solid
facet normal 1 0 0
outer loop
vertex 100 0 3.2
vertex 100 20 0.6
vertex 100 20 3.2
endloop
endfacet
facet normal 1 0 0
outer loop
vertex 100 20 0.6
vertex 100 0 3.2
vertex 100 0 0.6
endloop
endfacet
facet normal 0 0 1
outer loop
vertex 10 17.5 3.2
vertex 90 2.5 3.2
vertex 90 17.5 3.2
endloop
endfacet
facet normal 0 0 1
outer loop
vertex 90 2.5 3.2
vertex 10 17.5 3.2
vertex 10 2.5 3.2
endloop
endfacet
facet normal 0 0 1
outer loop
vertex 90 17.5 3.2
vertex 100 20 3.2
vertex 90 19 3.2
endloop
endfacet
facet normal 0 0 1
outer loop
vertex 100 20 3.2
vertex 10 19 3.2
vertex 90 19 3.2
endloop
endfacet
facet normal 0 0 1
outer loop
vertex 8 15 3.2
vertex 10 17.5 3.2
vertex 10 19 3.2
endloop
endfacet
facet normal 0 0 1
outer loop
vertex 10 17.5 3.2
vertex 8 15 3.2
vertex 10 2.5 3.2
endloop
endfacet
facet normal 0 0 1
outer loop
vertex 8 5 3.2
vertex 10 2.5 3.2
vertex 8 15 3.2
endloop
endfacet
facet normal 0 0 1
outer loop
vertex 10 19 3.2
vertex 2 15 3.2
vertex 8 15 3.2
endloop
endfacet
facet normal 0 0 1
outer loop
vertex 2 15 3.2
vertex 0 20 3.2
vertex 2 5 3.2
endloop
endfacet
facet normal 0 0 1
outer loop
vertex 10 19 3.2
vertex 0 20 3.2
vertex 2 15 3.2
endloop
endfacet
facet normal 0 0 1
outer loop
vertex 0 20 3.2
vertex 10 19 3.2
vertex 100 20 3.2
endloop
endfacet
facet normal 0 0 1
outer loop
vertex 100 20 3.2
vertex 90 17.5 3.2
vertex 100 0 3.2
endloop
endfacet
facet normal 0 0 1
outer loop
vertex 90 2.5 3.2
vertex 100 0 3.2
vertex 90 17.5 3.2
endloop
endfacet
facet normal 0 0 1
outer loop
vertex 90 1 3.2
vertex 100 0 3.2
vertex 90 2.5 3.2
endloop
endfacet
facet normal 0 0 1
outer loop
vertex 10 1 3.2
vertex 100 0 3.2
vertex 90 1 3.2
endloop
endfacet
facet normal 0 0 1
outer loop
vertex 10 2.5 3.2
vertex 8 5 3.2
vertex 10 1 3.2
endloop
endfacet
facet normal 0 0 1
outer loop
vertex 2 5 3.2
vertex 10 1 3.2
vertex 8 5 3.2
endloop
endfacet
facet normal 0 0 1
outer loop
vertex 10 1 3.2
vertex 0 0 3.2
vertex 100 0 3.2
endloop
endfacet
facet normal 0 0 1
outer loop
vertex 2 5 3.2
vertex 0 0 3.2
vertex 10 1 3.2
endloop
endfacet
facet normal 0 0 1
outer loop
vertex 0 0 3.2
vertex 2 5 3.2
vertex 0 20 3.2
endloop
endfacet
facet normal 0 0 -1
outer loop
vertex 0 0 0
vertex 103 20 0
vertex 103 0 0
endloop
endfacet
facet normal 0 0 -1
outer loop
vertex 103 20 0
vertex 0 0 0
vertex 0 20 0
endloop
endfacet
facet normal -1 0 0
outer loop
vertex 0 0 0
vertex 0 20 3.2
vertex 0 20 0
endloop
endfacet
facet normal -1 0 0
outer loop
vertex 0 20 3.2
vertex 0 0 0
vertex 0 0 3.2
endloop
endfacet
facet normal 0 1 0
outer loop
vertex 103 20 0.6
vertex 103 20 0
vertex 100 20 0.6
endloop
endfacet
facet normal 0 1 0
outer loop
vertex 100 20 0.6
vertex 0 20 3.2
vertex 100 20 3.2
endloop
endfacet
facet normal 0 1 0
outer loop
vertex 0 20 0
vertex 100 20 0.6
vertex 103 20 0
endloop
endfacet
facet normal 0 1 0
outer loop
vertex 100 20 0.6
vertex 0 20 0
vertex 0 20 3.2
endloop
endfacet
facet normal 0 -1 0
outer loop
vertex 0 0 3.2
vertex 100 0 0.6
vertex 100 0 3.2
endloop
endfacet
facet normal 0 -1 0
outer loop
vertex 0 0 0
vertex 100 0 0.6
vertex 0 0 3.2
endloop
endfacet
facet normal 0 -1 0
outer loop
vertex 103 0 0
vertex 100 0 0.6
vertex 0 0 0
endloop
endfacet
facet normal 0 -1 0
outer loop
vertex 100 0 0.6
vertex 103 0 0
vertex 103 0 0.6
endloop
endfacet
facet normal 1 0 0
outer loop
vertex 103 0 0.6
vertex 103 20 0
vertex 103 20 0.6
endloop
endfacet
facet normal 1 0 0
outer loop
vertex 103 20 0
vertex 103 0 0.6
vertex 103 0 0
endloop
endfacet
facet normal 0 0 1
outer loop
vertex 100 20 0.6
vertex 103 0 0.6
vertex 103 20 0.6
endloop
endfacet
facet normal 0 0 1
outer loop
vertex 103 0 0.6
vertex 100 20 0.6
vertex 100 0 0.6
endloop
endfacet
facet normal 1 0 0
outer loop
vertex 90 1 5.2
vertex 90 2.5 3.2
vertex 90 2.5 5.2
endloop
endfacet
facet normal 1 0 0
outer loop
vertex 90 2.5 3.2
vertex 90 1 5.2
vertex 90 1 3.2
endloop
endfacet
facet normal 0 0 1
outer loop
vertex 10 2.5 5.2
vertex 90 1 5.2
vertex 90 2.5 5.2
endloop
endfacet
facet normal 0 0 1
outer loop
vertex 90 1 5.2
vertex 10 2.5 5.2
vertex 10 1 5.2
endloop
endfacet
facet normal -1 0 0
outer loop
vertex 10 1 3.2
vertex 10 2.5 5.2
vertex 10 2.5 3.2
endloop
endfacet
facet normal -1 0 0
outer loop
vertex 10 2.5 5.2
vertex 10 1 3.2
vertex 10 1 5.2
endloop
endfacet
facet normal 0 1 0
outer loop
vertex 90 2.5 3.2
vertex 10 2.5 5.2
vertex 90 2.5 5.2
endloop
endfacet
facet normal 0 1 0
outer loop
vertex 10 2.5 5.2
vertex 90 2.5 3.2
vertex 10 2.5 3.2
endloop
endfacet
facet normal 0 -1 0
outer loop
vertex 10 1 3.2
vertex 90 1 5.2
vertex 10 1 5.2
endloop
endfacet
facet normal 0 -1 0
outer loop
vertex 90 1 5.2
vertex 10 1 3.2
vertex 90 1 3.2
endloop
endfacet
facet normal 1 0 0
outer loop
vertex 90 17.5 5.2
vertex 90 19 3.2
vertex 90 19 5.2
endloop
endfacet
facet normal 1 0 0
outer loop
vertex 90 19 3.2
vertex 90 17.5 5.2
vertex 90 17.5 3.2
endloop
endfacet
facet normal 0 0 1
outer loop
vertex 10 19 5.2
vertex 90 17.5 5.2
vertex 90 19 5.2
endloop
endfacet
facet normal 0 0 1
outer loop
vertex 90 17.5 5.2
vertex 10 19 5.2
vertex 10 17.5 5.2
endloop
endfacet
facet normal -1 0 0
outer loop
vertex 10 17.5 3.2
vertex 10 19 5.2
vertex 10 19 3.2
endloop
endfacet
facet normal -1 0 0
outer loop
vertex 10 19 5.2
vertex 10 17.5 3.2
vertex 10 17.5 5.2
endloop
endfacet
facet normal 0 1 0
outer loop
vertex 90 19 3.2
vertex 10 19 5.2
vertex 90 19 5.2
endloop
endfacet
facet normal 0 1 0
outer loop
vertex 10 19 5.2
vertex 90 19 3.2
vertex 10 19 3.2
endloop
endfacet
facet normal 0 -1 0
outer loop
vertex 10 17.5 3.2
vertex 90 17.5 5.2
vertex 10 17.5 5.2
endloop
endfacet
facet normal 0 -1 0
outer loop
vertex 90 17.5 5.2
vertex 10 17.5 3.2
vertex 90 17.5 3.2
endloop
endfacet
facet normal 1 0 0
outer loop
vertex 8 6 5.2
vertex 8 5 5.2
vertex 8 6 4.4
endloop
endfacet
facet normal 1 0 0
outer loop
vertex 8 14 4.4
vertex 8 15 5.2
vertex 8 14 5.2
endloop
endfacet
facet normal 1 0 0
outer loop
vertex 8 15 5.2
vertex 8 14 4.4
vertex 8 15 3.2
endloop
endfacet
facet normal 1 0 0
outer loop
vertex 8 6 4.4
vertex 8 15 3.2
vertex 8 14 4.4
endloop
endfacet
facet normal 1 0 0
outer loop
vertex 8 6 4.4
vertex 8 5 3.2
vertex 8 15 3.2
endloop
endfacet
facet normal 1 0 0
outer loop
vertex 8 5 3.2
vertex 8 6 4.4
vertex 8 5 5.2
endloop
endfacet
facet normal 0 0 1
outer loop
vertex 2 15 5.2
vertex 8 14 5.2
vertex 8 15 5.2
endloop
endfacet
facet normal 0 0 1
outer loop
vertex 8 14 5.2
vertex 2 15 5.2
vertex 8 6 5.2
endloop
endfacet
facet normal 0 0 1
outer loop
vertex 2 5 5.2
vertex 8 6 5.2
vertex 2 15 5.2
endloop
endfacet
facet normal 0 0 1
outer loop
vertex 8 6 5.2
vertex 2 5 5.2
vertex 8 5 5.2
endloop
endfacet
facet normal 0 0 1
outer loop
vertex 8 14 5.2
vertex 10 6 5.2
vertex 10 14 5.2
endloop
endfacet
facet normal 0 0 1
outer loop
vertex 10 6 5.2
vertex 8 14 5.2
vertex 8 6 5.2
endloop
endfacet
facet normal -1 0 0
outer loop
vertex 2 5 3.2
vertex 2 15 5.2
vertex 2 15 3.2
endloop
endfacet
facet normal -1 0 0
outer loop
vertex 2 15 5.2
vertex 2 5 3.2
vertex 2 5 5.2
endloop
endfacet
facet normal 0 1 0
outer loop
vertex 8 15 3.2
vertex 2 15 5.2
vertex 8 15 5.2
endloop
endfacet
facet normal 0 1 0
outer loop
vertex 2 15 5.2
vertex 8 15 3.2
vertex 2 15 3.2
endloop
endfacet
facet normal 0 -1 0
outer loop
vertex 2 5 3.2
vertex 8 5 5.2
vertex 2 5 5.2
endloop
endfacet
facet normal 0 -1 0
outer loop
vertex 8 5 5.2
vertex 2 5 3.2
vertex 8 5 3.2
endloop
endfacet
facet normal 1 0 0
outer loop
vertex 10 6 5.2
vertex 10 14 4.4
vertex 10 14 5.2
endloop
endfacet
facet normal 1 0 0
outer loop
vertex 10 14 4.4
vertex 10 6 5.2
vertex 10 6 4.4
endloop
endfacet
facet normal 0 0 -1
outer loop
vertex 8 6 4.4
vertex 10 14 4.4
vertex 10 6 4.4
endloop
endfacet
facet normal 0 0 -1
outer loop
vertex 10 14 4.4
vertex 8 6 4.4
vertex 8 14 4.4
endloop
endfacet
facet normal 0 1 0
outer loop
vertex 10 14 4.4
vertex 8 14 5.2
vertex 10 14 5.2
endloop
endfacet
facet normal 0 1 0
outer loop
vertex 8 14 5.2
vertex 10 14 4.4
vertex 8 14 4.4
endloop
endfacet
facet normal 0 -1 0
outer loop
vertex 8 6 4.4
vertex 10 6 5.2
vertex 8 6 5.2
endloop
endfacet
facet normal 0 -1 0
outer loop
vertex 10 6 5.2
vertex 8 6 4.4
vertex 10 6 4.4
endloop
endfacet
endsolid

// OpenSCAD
// Bag clip with living hinge - PETG, 0.4mm nozzle, no supports
// Printed open flat (two arms end-to-end), closes by folding 180deg about Y.
// Lower arm at origin, upper arm local origin at its hinge edge.

part = "arm_lower"; // [arm_lower, arm_upper, assembly]
cadverify_only = "";

/* Dimensions (mm) */
Lbody = 100;      // arm body length
Wbody = 20;       // arm width
Tbody = 3.2;      // arm thickness
Hhinge = 6;       // total hinge length (gap between bodies)
Hhalf = 3;        // hinge half length per arm
Thinge = 0.6;     // hinge thickness
Bgap = 2.0;       // bag thickness / closed gap
Ttot = Tbody + Bgap; // 5.2 closed inner top
Zpiv = Tbody + Bgap/2; // 4.2 pivot height
Xpiv = Lbody + Hhalf;  // 103 pivot X in assembly

module instance(name, part, unit = 1) {
    echo(cadverify_instance = [name, part, unit]);
    if (cadverify_only == "" || cadverify_only == name) children();
}

// ---------- lower arm geometry (print orientation, min at 0) ----------
module arm_lower() {
    // body
    cube([Lbody, Wbody, Tbody], false);
    // hinge half (thin, on bed), overlap 0.1 into body
    translate([Lbody-0.1, 0, 0])
        cube([Hhalf+0.1, Wbody, Thinge], false);
    // (no heel: the ribs and latch towers are the close stop)
    // ribs (2mm tall standoff), overlap 0.1 into body
    translate([10, 1, Tbody-0.1])
        cube([80, 1.5, Bgap+0.1], false);
    translate([10, 17.5, Tbody-0.1])
        cube([80, 1.5, Bgap+0.1], false);
    // latch tower, overlap into body
    translate([2, 5, Tbody-0.1])
        cube([6, 10, Bgap+0.1], false);
    // latch lip (cantilever +X), overlap into tower
    translate([7.9, 6, 4.4])
        cube([2.1, 8, 0.8], false);
}

// ---------- upper arm geometry (print orientation, hinge at x=0) ----------
module arm_upper() {
    // hinge half on bed
    cube([Hhalf+0.1, Wbody, Thinge], false);
    // body, overlap into hinge
    translate([Hhalf-0.1, 0, 0])
        cube([Lbody+0.1, Wbody, Tbody], false);
    // latch tower (maps to closed x=12-18), overlap into body
    translate([85, 5, Tbody-0.1])
        cube([6, 10, Bgap+0.1], false);
    // latch lip (extends +X toward free end), overlap into tower
    translate([90.9, 6, 4.2])
        cube([2.5, 8, 1.0], false);
    // thumb tab beyond free end, same thickness as body, overlap
    translate([102.9, 6, 0])
        cube([8.1, 8, Tbody], false);
}

// ---------- part / assembly dispatch ----------
if (part == "arm_lower") {
    echo(cadverify_spec = [
        ["bounds", [[0, 0, 0], [103, 20, 5.2]]],
        ["bodies", 1],
        ["through_holes", 0],
        ["support_faces", [["bed", "-z", 1500]]],
        ["overhangs_allowed", [["latch lip", [[7.5, 5.5, 4.0], [10.5, 14.5, 5.5]]]]],
        ["copies", 1],
        ["details", [
            ["arm", "material", [[20, 6, 1.0], [80, 14, 2.2]], 1],
            ["arm_wall", "thickness", [50, 10, 10], [0, 0, -1], 3.2],
            ["hinge", "thickness", [101.5, 10, 5], [0, 0, -1], 0.6],
            ["rib", "material", [[20, 1.2, 3.5], [80, 2.3, 5.0]], 1],
            ["latch_tower", "material", [[3, 6, 3.5], [7, 14, 5.0]], 1],
            ["latch_lip", "material", [[8.3, 7, 4.6], [9.6, 13, 5.0]], 1],
            ["bag_slot", "void", [[20, 3, 3.5], [80, 17, 5.0]], 1]
        ]]
    ]);
    arm_lower();
} else if (part == "arm_upper") {
    echo(cadverify_spec = [
        ["bounds", [[0, 0, 0], [111, 20, 5.2]]],
        ["bodies", 1],
        ["through_holes", 0],
        ["support_faces", [["bed", "-z", 1500]]],
        ["overhangs_allowed", [["latch lip", [[90.5, 5.5, 4.0], [94.5, 14.5, 5.5]]]]],
        ["copies", 1],
        ["details", [
            ["arm", "material", [[10, 6, 1.0], [80, 14, 2.2]], 1],
            ["arm_wall", "thickness", [50, 10, 10], [0, 0, -1], 3.2],
            ["hinge", "thickness", [1.5, 10, 5], [0, 0, -1], 0.6],
            ["latch_tower", "material", [[86, 6, 3.5], [90, 14, 5.0]], 1],
            ["latch_lip", "material", [[91.5, 8, 4.4], [92.8, 12, 5.0]], 1],
            ["thumb_tab", "material", [[104, 7, 1.0], [110, 13, 2.2]], 1],
            ["field", "void", [[10, 3, 3.5], [80, 17, 5.0]], 1]
        ]]
    ]);
    arm_upper();
} else if (part == "assembly") {
    echo(cadverify_spec = [
        ["bounds", [[0, 0, 0], [214, 20, 5.2]]],
        ["support_faces", [["bed", "-z", 3000]]],
        ["motions", [
            ["close", ["upper"], "rotate", [103, 10, 4.2], [0, -1, 0], [0, 180],
                ["flex", [["upper", "lower", 1.0, "latch snap"]]],
                ["stops", [180]]
            ]
        ]],
        ["assembly_order", [
            [["lower"], [0, 0, 0]],
            [["upper"], [0, 0, -1]]
        ]]
    ]);
    instance("lower", "arm_lower") arm_lower();
    instance("upper", "arm_upper") translate([103, 0, 0]) arm_upper();
}
